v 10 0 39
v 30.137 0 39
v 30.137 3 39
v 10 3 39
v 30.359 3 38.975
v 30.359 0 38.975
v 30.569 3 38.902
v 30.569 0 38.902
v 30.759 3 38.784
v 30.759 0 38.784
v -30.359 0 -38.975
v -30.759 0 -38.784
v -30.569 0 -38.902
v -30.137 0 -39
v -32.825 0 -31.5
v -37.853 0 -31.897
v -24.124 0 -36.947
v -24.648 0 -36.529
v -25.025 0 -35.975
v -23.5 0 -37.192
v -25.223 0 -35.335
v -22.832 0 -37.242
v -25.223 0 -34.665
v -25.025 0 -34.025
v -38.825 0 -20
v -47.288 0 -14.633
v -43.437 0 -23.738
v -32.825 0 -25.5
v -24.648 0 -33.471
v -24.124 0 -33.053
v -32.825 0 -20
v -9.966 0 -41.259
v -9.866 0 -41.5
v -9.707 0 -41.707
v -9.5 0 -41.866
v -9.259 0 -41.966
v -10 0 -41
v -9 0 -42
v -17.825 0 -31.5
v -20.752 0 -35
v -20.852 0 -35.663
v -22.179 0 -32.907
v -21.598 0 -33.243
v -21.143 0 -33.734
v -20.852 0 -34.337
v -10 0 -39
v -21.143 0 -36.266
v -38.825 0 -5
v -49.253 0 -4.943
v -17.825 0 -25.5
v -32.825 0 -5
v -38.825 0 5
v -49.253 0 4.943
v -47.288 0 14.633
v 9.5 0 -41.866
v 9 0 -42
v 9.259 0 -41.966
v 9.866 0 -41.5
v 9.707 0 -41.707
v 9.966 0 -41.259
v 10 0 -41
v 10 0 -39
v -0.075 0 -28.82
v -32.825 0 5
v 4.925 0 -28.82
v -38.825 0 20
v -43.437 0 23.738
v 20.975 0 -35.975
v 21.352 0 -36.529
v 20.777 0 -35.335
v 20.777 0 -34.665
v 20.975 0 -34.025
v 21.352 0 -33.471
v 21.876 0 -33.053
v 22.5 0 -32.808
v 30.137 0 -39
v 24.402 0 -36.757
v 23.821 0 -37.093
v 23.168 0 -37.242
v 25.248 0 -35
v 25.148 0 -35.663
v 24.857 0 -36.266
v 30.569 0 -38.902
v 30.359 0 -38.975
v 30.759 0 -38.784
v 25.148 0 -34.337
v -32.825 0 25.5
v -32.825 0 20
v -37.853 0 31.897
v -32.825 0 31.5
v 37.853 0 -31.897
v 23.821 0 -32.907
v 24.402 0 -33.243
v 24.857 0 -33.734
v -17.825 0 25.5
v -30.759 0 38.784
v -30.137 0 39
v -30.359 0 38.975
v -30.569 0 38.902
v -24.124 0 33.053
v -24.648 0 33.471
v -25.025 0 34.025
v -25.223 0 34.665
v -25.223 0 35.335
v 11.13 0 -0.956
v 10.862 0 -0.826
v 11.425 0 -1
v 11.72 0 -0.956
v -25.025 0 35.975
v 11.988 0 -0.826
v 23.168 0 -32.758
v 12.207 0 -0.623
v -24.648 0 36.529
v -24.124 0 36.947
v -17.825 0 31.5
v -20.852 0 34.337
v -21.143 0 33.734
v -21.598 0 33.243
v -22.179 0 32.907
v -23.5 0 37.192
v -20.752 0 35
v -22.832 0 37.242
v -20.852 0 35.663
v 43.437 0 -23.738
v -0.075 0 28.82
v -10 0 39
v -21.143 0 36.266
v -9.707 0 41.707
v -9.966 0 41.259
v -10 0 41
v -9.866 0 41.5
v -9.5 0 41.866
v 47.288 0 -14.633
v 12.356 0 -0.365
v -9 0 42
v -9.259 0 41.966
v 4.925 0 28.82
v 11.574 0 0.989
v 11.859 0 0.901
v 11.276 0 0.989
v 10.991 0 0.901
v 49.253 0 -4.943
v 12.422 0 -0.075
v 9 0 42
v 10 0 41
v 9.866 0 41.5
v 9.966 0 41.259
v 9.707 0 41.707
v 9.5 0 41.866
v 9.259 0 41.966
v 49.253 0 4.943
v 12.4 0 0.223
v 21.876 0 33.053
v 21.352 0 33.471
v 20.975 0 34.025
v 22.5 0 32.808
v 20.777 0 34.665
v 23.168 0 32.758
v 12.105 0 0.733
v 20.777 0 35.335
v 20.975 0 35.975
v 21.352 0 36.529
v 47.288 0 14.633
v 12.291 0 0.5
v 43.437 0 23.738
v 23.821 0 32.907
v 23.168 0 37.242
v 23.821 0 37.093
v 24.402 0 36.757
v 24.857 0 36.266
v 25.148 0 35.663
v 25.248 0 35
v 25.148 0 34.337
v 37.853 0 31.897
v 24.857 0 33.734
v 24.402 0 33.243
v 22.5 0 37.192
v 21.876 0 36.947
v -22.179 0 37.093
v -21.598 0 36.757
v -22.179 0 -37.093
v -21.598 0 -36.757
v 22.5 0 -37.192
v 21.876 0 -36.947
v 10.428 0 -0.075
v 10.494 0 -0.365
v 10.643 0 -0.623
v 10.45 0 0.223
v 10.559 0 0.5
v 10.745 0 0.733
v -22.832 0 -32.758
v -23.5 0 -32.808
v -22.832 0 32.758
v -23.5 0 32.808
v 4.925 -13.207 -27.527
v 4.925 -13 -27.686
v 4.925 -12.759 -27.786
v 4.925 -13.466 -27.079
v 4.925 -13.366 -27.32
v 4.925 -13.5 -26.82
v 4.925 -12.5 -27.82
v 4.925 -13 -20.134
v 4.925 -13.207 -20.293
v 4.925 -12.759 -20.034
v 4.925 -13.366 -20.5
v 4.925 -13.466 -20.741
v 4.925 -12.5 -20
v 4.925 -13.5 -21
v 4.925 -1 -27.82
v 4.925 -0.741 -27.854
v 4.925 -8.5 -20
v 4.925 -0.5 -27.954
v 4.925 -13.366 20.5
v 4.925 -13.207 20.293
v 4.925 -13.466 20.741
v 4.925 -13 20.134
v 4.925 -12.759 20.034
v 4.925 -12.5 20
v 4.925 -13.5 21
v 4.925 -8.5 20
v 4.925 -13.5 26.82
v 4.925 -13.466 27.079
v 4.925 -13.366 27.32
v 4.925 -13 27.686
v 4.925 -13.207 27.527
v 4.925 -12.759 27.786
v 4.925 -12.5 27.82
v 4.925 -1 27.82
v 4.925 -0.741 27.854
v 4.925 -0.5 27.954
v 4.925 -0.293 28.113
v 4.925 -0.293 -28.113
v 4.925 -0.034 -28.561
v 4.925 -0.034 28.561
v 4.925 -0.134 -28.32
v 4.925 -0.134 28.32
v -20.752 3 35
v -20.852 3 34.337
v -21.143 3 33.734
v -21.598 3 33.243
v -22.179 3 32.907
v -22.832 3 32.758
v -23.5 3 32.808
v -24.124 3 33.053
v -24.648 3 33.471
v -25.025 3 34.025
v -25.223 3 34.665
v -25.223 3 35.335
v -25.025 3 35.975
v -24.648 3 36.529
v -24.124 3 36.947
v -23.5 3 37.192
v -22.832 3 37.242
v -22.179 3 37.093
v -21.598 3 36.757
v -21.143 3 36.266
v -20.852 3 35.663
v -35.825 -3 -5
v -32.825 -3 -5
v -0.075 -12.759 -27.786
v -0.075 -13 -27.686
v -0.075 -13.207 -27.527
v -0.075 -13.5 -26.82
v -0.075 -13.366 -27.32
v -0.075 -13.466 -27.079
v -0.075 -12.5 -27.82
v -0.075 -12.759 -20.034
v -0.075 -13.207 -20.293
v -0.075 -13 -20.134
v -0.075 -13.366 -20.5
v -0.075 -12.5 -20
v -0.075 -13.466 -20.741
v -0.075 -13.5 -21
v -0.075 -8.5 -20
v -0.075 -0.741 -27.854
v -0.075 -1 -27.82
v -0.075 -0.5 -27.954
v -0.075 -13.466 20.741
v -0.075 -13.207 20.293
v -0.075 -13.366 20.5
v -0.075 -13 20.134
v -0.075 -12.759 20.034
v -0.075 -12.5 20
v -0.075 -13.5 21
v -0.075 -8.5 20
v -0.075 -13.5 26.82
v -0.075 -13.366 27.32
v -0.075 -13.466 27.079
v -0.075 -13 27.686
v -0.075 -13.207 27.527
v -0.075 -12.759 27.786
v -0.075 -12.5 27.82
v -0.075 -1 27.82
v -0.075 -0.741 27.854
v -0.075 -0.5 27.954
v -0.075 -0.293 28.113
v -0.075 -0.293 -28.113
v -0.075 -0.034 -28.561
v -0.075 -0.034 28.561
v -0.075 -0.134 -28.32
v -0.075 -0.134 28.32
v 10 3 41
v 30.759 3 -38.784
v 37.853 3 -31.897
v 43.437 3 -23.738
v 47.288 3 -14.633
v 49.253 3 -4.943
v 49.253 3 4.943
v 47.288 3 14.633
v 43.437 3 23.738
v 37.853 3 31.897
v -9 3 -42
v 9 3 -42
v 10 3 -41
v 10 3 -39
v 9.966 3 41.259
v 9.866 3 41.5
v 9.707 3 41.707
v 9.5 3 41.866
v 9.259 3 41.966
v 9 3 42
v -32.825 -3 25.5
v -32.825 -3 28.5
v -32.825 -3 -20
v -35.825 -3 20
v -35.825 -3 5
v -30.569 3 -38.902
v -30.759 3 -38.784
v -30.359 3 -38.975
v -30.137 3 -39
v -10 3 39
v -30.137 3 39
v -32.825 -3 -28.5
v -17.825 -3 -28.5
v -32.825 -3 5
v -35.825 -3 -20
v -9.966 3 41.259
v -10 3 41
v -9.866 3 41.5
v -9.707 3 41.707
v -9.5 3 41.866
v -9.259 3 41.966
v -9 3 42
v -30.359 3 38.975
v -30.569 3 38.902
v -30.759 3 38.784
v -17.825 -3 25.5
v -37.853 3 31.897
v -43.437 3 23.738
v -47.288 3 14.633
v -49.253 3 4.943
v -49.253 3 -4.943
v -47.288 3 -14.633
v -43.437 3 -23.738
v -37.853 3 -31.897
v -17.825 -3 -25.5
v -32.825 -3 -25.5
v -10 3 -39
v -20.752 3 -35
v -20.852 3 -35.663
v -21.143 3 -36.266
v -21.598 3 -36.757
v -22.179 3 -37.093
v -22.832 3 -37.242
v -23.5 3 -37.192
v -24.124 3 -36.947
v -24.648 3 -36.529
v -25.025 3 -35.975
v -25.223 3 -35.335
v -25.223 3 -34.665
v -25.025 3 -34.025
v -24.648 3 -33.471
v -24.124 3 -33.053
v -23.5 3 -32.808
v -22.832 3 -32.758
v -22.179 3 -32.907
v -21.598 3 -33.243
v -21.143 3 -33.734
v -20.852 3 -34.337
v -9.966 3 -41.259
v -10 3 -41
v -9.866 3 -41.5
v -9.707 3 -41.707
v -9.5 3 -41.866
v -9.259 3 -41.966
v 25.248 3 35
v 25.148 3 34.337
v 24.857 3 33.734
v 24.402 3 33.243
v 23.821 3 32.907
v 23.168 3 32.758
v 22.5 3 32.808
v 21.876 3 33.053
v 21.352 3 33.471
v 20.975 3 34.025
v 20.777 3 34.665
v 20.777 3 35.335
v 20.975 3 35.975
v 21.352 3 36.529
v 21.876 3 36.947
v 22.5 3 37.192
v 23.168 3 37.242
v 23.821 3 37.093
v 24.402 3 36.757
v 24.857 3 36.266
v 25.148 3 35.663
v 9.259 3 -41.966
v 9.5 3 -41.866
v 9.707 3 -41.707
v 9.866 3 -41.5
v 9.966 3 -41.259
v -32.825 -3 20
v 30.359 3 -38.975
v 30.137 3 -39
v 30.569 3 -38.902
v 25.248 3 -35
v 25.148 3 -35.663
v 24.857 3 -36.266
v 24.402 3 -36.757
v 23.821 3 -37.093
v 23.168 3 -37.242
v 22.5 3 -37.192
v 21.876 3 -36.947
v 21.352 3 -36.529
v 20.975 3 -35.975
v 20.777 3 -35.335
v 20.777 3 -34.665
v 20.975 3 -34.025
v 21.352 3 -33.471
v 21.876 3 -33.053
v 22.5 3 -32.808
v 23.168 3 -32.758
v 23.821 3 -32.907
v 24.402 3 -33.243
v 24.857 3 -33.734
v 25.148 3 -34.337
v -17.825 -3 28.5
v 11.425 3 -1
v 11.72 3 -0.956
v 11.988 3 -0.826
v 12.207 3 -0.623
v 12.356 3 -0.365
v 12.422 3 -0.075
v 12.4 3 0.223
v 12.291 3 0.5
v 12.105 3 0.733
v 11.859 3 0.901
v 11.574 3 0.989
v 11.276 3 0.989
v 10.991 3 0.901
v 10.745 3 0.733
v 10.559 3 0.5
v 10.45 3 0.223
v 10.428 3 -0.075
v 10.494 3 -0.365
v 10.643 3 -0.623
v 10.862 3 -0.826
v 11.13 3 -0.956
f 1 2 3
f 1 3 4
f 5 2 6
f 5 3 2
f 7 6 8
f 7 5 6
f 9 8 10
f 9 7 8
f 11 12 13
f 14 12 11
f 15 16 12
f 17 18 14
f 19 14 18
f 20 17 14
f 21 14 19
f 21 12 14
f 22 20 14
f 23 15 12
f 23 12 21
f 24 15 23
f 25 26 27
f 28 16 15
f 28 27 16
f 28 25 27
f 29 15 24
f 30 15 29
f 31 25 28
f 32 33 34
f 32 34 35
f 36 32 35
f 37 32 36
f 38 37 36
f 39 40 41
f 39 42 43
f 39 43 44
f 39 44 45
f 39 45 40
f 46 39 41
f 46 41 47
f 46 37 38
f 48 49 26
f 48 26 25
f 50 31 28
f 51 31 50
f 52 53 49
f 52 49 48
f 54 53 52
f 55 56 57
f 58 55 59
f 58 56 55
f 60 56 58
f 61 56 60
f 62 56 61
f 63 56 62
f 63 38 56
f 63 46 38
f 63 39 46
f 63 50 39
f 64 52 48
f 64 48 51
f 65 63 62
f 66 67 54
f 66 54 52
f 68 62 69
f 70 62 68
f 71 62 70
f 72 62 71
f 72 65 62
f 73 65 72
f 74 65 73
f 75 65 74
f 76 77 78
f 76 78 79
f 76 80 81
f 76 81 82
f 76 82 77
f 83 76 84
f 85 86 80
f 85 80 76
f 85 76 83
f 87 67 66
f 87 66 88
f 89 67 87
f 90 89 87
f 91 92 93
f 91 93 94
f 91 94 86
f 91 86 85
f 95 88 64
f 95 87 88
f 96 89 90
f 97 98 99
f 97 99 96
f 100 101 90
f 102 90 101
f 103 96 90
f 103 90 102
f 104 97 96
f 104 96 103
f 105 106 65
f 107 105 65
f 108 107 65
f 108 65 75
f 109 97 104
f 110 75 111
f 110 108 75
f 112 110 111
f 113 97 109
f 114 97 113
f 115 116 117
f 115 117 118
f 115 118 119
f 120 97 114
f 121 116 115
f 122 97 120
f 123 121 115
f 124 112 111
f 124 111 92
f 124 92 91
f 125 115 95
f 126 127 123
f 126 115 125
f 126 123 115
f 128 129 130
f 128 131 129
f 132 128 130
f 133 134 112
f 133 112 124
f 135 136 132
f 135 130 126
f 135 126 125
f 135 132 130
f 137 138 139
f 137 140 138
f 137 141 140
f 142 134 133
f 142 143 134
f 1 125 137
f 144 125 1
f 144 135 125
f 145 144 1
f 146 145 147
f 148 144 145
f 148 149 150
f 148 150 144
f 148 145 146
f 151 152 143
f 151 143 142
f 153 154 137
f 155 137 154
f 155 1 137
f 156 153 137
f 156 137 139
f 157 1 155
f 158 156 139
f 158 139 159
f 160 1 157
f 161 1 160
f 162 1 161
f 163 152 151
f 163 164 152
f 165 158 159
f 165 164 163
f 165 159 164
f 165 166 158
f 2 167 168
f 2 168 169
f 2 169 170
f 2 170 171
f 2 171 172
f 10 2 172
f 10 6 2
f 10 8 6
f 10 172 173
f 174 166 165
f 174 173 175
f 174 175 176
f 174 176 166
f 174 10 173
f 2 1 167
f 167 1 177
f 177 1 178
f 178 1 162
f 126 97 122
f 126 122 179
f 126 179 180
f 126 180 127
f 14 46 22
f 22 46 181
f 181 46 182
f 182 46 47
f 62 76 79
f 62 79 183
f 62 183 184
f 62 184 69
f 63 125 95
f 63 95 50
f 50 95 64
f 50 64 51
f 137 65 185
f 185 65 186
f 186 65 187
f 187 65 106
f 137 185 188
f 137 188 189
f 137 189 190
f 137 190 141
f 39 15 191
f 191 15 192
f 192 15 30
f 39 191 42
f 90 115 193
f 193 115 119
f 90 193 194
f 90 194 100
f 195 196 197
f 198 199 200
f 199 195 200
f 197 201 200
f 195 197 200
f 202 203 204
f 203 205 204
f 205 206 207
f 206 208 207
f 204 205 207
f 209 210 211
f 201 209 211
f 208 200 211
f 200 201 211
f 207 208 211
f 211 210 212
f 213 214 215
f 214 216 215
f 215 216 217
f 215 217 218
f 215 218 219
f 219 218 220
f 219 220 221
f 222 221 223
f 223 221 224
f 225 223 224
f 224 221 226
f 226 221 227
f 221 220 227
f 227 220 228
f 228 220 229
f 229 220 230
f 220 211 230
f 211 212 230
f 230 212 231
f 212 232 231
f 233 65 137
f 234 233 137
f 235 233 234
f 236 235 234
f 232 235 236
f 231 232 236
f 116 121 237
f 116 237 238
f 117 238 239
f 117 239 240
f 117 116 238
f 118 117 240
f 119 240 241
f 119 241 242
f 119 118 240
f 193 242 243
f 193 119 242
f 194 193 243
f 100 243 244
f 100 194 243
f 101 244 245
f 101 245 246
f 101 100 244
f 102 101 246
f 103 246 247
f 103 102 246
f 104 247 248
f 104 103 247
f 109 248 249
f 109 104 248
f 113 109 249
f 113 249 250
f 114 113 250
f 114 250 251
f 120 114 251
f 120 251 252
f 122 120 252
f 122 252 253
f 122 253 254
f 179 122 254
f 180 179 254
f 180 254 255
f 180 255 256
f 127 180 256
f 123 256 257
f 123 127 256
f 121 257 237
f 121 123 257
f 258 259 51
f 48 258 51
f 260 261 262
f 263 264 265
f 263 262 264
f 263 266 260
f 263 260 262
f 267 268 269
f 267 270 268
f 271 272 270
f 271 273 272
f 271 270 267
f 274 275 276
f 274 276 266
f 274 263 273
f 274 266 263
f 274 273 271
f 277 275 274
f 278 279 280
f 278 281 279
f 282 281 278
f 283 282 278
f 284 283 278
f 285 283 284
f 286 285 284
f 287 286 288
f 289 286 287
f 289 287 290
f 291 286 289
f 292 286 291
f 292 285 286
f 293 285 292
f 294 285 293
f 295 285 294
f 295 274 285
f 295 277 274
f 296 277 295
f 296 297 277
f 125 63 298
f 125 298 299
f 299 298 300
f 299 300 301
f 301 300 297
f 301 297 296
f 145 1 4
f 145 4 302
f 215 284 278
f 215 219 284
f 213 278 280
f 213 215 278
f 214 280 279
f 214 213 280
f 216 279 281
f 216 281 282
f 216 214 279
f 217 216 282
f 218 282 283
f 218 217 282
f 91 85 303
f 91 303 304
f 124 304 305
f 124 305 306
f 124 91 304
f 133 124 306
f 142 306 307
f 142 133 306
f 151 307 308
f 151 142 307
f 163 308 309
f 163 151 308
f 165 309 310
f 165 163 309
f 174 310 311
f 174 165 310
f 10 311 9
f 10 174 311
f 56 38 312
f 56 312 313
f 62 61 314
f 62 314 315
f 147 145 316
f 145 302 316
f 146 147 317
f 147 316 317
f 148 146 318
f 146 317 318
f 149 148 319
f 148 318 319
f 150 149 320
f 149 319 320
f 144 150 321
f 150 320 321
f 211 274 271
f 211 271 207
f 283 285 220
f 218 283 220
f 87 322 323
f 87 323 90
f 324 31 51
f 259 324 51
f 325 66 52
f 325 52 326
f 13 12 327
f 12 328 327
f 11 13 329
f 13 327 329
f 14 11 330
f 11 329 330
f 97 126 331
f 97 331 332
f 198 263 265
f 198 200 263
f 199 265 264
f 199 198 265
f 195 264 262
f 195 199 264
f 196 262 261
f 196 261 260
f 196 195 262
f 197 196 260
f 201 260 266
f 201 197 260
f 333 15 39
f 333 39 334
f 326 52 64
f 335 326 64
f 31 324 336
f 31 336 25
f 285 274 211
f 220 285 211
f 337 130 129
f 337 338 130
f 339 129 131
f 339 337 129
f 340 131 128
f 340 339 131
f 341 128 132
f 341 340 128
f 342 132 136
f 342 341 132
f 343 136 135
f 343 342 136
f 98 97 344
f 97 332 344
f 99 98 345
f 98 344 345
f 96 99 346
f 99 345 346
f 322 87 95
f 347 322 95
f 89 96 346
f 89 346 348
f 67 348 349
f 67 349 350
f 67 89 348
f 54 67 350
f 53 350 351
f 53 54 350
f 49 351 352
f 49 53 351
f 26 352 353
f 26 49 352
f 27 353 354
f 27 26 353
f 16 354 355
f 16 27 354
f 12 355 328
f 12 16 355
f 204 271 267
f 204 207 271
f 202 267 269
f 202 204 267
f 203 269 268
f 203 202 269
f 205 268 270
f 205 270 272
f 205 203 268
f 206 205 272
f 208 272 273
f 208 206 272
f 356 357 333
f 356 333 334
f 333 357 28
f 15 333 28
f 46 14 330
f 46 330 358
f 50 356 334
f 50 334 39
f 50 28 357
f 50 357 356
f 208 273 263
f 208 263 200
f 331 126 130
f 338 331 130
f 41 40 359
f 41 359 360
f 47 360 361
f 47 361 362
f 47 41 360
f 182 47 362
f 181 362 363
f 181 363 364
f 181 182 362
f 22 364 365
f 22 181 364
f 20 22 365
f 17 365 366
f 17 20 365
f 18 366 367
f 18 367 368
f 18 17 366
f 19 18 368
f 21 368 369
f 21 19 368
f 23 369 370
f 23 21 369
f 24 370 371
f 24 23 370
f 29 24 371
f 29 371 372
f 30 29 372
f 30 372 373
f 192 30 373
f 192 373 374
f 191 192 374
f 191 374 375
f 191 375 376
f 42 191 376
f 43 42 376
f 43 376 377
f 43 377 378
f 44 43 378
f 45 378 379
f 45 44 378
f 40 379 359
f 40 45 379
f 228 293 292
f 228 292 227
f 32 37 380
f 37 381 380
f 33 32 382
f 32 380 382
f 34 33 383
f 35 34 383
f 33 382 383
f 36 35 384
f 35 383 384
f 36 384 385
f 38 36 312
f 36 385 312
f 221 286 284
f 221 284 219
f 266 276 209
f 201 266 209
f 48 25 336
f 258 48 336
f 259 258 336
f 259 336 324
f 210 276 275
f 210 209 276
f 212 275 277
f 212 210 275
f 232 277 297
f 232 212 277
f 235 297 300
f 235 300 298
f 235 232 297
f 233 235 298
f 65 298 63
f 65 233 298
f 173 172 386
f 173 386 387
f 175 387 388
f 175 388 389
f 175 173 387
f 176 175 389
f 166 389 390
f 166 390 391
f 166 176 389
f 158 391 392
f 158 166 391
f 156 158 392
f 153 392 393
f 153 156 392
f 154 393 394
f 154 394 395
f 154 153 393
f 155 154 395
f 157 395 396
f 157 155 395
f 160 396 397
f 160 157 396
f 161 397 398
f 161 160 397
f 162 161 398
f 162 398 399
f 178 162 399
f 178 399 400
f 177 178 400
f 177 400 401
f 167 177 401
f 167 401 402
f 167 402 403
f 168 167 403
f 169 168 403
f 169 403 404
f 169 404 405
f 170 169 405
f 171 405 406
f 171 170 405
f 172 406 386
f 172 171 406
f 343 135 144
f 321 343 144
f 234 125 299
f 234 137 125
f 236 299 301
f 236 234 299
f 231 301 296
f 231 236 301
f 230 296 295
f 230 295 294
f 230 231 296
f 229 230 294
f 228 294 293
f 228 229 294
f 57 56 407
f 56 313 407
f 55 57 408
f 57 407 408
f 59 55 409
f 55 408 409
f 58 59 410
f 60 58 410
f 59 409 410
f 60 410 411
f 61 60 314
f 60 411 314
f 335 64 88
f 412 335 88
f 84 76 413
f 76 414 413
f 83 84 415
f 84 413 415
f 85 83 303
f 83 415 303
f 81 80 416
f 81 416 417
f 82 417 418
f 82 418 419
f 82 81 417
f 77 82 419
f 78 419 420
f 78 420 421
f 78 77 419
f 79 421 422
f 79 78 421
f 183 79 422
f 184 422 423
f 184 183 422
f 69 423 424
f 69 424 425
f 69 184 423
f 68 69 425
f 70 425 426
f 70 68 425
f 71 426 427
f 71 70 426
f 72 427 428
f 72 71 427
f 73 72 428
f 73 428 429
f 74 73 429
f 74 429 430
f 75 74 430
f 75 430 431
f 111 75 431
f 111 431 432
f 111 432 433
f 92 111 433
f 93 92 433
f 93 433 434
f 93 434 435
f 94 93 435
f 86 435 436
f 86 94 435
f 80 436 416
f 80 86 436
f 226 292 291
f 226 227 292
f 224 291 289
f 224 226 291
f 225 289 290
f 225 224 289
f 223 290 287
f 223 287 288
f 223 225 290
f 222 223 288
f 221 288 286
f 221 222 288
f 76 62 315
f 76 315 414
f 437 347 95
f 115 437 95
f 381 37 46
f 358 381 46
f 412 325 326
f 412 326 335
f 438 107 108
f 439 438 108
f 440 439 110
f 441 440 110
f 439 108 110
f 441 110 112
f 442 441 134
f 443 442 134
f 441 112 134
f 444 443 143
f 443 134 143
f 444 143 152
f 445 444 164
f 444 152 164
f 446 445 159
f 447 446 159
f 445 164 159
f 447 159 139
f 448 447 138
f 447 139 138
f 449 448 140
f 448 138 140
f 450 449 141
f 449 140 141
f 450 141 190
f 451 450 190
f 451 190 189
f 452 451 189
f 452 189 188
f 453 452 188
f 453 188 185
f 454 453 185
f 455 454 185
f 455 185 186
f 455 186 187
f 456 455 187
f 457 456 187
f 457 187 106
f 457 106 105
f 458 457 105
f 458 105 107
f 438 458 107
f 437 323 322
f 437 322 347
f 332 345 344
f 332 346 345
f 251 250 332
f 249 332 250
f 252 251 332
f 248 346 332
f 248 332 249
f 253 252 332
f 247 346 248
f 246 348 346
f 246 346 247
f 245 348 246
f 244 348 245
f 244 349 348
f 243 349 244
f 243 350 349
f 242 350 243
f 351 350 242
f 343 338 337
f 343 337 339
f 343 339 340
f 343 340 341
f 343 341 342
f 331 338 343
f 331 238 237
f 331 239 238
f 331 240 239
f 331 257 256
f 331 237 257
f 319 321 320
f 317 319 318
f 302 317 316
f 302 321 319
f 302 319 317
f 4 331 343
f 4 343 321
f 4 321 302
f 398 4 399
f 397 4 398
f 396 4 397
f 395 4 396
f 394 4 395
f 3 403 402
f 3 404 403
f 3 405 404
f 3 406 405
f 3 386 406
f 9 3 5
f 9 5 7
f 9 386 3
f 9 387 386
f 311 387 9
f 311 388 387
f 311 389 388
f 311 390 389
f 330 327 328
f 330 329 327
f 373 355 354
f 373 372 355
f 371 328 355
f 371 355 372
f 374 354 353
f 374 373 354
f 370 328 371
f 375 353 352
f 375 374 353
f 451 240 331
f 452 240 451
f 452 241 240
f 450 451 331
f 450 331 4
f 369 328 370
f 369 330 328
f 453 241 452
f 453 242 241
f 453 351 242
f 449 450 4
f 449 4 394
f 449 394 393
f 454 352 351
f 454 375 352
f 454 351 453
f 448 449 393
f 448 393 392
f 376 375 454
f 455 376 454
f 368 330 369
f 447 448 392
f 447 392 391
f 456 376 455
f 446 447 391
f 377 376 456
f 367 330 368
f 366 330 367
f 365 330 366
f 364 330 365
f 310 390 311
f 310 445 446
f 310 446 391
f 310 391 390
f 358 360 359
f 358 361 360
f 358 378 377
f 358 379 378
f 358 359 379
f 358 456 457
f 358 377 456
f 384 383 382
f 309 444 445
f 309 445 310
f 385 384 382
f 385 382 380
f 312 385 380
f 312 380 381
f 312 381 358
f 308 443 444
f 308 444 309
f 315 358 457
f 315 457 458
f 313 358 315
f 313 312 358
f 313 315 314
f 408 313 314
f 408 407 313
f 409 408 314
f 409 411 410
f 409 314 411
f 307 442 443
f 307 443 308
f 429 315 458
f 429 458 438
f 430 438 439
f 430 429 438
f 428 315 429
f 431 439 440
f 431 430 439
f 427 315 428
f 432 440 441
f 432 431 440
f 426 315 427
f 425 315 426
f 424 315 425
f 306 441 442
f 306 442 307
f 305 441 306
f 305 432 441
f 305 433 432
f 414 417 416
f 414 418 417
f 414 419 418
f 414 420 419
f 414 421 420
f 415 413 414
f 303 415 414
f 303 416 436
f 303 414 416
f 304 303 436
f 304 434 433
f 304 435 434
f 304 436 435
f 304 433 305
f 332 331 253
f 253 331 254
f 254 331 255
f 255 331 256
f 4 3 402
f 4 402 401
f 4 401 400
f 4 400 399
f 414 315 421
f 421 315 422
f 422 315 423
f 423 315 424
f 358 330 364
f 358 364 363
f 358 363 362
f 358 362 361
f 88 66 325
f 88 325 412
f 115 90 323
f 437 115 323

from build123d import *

# Parameters (mm, degrees)
A_BASE_T42_OUTLINE_R          = 2.2479
A_BASE_T42_OUTLINE_R_2        = 1
A_BASE_T42_DEPTH              = 3
OUTER_RIM_CUT_DEPTH           = 68.299702823
SKETCH2_W                     = 20
SKETCH2_H                     = 3
FLANGES_DEPTH                 = 3
CONTOURING_R                  = 1
SKETCH9_R                     = 1
SINGLE_TENDON_PORT_DEPTH      = 65.986537067
SKETCH3_W                     = 15
SKETCH3_H                     = 3
SKETCH3_W_2                   = 3
SKETCH3_H_2                   = 15
BASE_SUPPORTS_DEPTH           = 3
BASE_SUPPORTS_CHAMFER_SIZE    = 3
SKETCH10_R                    = 1
COVER_DEPTH                   = 3
SKETCH6_W                     = 5
SKETCH6_H                     = 55.64
SERVO_SIDE_SUPPORTS_DEPTH     = 8.5
SKETCH7_W                     = 5
SKETCH7_H                     = 7.82
SERVO_SIDE_SUPPORT_ENDS_DEPTH = 5
SERVO_CONTOURING_R            = 1


with BuildPart() as part:
    # a_base_t42: read off the stored shape, not the designer's step
    # a_base_t42 outline → a_base_t42 (new body)
    with BuildSketch(Plane(origin=(0, 0, 0), x_dir=(1, 0, 0), z_dir=(0, 1, 0))):
        with BuildLine():
            ThreePointArc((31.5, -42), (52.5, 0), (31.5, 42))
            Line((31.5, 42), (-31.5, 42))
            ThreePointArc((-31.5, 42), (-52.5, 0), (-31.5, -42))
            Line((-31.5, -42), (31.5, -42))
        make_face()
        with Locations((-23, -35)):
            Circle(A_BASE_T42_OUTLINE_R, mode=Mode.SUBTRACT)
        with Locations((23, -35)):
            Circle(A_BASE_T42_OUTLINE_R, mode=Mode.SUBTRACT)
        with Locations((-40.25, 0)):
            Circle(A_BASE_T42_OUTLINE_R_2, mode=Mode.SUBTRACT)
        with Locations((-23, 35)):
            Circle(A_BASE_T42_OUTLINE_R, mode=Mode.SUBTRACT)
        with Locations((40.25, 0)):
            Circle(A_BASE_T42_OUTLINE_R_2, mode=Mode.SUBTRACT)
        with Locations((23, 35)):
            Circle(A_BASE_T42_OUTLINE_R, mode=Mode.SUBTRACT)
    extrude(amount=A_BASE_T42_DEPTH)

    # Sketch1 → Outer Rim Cut (cut, through all)
    with BuildSketch(Plane.XZ):
        with BuildLine():
            Line((31.5, 42), (-31.5, 42))
            ThreePointArc((-31.5, 42), (-52.5, 0), (-31.5, -42))
            Line((-31.5, -42), (31.5, -42))
            ThreePointArc((31.5, -42), (52.5, 0), (31.5, 42))
        make_face()
        with BuildLine():
            Line((30.483602149, 39), (-30.483602149, 39))
            ThreePointArc((-30.483602149, 39), (-49.5, 0), (-30.483602149, -39))
            Line((-30.483602149, -39), (30.483602149, -39))
            ThreePointArc((30.483602149, -39), (49.5, 0), (30.483602149, 39))
        make_face(mode=Mode.SUBTRACT)
    extrude(amount=-OUTER_RIM_CUT_DEPTH, mode=Mode.SUBTRACT)

    # Sketch2 → Flanges (add)
    with BuildSketch(Plane.XZ):
        with Locations((0, -40.5)):
            Rectangle(SKETCH2_W, SKETCH2_H)
        with Locations((0, 40.5)):
            Rectangle(SKETCH2_W, SKETCH2_H)
    extrude(amount=-FLANGES_DEPTH)

    # Contouring
    contouring_edges = [part.edges().sort_by_distance(p)[0] for p in [
        (30.483602149, 1.5, -39),
        (-30.483602149, 1.5, -39),
        (10, 1.5, -42),
        (-10, 1.5, -42),
        (30.483602149, 1.5, 39),
        (-30.483602149, 1.5, 39),
        (10, 1.5, 42),
        (-10, 1.5, 42),
    ]]
    fillet(contouring_edges, radius=CONTOURING_R)

    # Sketch9 → Single Tendon Port (cut, through all)
    with BuildSketch(Plane.XZ):
        with Locations(Location((11.425, 0, 0), (0, 0, 270))):
            Circle(SKETCH9_R)
    extrude(amount=-SINGLE_TENDON_PORT_DEPTH, mode=Mode.SUBTRACT)

    # Sketch3 → Base Supports (add)
    with BuildSketch(Plane.XZ):
        with Locations((-25.325, -27)):
            Rectangle(SKETCH3_W, SKETCH3_H)
        with Locations((-25.325, 27)):
            Rectangle(SKETCH3_W, SKETCH3_H)
        with Locations((-34.325, -12.5)):
            Rectangle(SKETCH3_W_2, SKETCH3_H_2)
        with Locations((-34.325, 12.5)):
            Rectangle(SKETCH3_W_2, SKETCH3_H_2)
    extrude(amount=BASE_SUPPORTS_DEPTH)

    # Base Supports Chamfer
    # the kernel refuses this chamfer: 3 mm, written as the material it adds along each edge
    with BuildSketch(Plane(origin=(-32.825, 0, 28.5), x_dir=(0, 0, 1), z_dir=(1, 0, 0))) as base_supports_chamfer_piece_1_section:
        Polygon((BASE_SUPPORTS_CHAMFER_SIZE, 0), (0, BASE_SUPPORTS_CHAMFER_SIZE), (0, 0), align=None)
    base_supports_chamfer_piece_1 = extrude(amount=15, mode=Mode.PRIVATE)
    base_supports_chamfer_piece_1 = split(base_supports_chamfer_piece_1, bisect_by=Plane(origin=(-32.825, -3, 28.5), z_dir=(0, 1, 0)), keep=Keep.TOP, mode=Mode.PRIVATE)
    add(base_supports_chamfer_piece_1)
    with BuildSketch(Plane(origin=(-17.825, 0, -28.5), x_dir=(0, 0, -1), z_dir=(-1, 0, 0))) as base_supports_chamfer_piece_2_section:
        Polygon((BASE_SUPPORTS_CHAMFER_SIZE, 0), (0, BASE_SUPPORTS_CHAMFER_SIZE), (0, 0), align=None)
    base_supports_chamfer_piece_2 = extrude(amount=15, mode=Mode.PRIVATE)
    base_supports_chamfer_piece_2 = split(base_supports_chamfer_piece_2, bisect_by=Plane(origin=(-17.825, -3, -28.5), z_dir=(0, 1, 0)), keep=Keep.TOP, mode=Mode.PRIVATE)
    add(base_supports_chamfer_piece_2)
    with BuildSketch(Plane(origin=(-35.825, 0, 20), x_dir=(-1, 0, 0), z_dir=(0, 0, -1))) as base_supports_chamfer_piece_3_section:
        Polygon((BASE_SUPPORTS_CHAMFER_SIZE, 0), (0, -BASE_SUPPORTS_CHAMFER_SIZE), (0, 0), align=None)
    base_supports_chamfer_piece_3 = extrude(amount=15, mode=Mode.PRIVATE)
    base_supports_chamfer_piece_3 = split(base_supports_chamfer_piece_3, bisect_by=Plane(origin=(-35.825, -3, 20), z_dir=(0, 1, 0)), keep=Keep.TOP, mode=Mode.PRIVATE)
    add(base_supports_chamfer_piece_3)
    with BuildSketch(Plane(origin=(-35.825, 0, -20), x_dir=(-1, 0, 0), z_dir=(0, 0, 1))) as base_supports_chamfer_piece_4_section:
        Polygon((BASE_SUPPORTS_CHAMFER_SIZE, 0), (0, BASE_SUPPORTS_CHAMFER_SIZE), (0, 0), align=None)
    base_supports_chamfer_piece_4 = extrude(amount=15, mode=Mode.PRIVATE)
    base_supports_chamfer_piece_4 = split(base_supports_chamfer_piece_4, bisect_by=Plane(origin=(-35.825, -3, -20), z_dir=(0, 1, 0)), keep=Keep.TOP, mode=Mode.PRIVATE)
    add(base_supports_chamfer_piece_4)

    # Sketch10 → Cover (add)
    with BuildSketch(Plane.XZ):
        with Locations((-40.25, 0)):
            Circle(SKETCH10_R)
        with Locations((40.25, 0)):
            Circle(SKETCH10_R)
    extrude(amount=-COVER_DEPTH)

    # Sketch6 → Servo Side Supports (add)
    with BuildSketch(Plane.XZ):
        with Locations((2.425, 0)):
            Rectangle(SKETCH6_W, SKETCH6_H)
    extrude(amount=SERVO_SIDE_SUPPORTS_DEPTH)

    # Sketch7 → Servo Side Support Ends (add)
    with BuildSketch(Plane.XZ.offset(8.5)):
        with Locations((2.425, 23.91)):
            Rectangle(SKETCH7_W, SKETCH7_H)
        with Locations((2.425, -23.91)):
            Rectangle(SKETCH7_W, SKETCH7_H)
    extrude(amount=SERVO_SIDE_SUPPORT_ENDS_DEPTH)

    # Servo Contouring
    servo_contouring_edges = [part.edges().sort_by_distance(p)[0] for p in [
        (2.425, 0, -27.82),
        (2.425, 0, 27.82),
        (2.425, -13.5, 20),
        (2.425, -13.5, 27.82),
        (2.425, -13.5, -27.82),
        (2.425, -13.5, -20),
    ]]
    fillet(servo_contouring_edges, radius=SERVO_CONTOURING_R)


solid = part.part
